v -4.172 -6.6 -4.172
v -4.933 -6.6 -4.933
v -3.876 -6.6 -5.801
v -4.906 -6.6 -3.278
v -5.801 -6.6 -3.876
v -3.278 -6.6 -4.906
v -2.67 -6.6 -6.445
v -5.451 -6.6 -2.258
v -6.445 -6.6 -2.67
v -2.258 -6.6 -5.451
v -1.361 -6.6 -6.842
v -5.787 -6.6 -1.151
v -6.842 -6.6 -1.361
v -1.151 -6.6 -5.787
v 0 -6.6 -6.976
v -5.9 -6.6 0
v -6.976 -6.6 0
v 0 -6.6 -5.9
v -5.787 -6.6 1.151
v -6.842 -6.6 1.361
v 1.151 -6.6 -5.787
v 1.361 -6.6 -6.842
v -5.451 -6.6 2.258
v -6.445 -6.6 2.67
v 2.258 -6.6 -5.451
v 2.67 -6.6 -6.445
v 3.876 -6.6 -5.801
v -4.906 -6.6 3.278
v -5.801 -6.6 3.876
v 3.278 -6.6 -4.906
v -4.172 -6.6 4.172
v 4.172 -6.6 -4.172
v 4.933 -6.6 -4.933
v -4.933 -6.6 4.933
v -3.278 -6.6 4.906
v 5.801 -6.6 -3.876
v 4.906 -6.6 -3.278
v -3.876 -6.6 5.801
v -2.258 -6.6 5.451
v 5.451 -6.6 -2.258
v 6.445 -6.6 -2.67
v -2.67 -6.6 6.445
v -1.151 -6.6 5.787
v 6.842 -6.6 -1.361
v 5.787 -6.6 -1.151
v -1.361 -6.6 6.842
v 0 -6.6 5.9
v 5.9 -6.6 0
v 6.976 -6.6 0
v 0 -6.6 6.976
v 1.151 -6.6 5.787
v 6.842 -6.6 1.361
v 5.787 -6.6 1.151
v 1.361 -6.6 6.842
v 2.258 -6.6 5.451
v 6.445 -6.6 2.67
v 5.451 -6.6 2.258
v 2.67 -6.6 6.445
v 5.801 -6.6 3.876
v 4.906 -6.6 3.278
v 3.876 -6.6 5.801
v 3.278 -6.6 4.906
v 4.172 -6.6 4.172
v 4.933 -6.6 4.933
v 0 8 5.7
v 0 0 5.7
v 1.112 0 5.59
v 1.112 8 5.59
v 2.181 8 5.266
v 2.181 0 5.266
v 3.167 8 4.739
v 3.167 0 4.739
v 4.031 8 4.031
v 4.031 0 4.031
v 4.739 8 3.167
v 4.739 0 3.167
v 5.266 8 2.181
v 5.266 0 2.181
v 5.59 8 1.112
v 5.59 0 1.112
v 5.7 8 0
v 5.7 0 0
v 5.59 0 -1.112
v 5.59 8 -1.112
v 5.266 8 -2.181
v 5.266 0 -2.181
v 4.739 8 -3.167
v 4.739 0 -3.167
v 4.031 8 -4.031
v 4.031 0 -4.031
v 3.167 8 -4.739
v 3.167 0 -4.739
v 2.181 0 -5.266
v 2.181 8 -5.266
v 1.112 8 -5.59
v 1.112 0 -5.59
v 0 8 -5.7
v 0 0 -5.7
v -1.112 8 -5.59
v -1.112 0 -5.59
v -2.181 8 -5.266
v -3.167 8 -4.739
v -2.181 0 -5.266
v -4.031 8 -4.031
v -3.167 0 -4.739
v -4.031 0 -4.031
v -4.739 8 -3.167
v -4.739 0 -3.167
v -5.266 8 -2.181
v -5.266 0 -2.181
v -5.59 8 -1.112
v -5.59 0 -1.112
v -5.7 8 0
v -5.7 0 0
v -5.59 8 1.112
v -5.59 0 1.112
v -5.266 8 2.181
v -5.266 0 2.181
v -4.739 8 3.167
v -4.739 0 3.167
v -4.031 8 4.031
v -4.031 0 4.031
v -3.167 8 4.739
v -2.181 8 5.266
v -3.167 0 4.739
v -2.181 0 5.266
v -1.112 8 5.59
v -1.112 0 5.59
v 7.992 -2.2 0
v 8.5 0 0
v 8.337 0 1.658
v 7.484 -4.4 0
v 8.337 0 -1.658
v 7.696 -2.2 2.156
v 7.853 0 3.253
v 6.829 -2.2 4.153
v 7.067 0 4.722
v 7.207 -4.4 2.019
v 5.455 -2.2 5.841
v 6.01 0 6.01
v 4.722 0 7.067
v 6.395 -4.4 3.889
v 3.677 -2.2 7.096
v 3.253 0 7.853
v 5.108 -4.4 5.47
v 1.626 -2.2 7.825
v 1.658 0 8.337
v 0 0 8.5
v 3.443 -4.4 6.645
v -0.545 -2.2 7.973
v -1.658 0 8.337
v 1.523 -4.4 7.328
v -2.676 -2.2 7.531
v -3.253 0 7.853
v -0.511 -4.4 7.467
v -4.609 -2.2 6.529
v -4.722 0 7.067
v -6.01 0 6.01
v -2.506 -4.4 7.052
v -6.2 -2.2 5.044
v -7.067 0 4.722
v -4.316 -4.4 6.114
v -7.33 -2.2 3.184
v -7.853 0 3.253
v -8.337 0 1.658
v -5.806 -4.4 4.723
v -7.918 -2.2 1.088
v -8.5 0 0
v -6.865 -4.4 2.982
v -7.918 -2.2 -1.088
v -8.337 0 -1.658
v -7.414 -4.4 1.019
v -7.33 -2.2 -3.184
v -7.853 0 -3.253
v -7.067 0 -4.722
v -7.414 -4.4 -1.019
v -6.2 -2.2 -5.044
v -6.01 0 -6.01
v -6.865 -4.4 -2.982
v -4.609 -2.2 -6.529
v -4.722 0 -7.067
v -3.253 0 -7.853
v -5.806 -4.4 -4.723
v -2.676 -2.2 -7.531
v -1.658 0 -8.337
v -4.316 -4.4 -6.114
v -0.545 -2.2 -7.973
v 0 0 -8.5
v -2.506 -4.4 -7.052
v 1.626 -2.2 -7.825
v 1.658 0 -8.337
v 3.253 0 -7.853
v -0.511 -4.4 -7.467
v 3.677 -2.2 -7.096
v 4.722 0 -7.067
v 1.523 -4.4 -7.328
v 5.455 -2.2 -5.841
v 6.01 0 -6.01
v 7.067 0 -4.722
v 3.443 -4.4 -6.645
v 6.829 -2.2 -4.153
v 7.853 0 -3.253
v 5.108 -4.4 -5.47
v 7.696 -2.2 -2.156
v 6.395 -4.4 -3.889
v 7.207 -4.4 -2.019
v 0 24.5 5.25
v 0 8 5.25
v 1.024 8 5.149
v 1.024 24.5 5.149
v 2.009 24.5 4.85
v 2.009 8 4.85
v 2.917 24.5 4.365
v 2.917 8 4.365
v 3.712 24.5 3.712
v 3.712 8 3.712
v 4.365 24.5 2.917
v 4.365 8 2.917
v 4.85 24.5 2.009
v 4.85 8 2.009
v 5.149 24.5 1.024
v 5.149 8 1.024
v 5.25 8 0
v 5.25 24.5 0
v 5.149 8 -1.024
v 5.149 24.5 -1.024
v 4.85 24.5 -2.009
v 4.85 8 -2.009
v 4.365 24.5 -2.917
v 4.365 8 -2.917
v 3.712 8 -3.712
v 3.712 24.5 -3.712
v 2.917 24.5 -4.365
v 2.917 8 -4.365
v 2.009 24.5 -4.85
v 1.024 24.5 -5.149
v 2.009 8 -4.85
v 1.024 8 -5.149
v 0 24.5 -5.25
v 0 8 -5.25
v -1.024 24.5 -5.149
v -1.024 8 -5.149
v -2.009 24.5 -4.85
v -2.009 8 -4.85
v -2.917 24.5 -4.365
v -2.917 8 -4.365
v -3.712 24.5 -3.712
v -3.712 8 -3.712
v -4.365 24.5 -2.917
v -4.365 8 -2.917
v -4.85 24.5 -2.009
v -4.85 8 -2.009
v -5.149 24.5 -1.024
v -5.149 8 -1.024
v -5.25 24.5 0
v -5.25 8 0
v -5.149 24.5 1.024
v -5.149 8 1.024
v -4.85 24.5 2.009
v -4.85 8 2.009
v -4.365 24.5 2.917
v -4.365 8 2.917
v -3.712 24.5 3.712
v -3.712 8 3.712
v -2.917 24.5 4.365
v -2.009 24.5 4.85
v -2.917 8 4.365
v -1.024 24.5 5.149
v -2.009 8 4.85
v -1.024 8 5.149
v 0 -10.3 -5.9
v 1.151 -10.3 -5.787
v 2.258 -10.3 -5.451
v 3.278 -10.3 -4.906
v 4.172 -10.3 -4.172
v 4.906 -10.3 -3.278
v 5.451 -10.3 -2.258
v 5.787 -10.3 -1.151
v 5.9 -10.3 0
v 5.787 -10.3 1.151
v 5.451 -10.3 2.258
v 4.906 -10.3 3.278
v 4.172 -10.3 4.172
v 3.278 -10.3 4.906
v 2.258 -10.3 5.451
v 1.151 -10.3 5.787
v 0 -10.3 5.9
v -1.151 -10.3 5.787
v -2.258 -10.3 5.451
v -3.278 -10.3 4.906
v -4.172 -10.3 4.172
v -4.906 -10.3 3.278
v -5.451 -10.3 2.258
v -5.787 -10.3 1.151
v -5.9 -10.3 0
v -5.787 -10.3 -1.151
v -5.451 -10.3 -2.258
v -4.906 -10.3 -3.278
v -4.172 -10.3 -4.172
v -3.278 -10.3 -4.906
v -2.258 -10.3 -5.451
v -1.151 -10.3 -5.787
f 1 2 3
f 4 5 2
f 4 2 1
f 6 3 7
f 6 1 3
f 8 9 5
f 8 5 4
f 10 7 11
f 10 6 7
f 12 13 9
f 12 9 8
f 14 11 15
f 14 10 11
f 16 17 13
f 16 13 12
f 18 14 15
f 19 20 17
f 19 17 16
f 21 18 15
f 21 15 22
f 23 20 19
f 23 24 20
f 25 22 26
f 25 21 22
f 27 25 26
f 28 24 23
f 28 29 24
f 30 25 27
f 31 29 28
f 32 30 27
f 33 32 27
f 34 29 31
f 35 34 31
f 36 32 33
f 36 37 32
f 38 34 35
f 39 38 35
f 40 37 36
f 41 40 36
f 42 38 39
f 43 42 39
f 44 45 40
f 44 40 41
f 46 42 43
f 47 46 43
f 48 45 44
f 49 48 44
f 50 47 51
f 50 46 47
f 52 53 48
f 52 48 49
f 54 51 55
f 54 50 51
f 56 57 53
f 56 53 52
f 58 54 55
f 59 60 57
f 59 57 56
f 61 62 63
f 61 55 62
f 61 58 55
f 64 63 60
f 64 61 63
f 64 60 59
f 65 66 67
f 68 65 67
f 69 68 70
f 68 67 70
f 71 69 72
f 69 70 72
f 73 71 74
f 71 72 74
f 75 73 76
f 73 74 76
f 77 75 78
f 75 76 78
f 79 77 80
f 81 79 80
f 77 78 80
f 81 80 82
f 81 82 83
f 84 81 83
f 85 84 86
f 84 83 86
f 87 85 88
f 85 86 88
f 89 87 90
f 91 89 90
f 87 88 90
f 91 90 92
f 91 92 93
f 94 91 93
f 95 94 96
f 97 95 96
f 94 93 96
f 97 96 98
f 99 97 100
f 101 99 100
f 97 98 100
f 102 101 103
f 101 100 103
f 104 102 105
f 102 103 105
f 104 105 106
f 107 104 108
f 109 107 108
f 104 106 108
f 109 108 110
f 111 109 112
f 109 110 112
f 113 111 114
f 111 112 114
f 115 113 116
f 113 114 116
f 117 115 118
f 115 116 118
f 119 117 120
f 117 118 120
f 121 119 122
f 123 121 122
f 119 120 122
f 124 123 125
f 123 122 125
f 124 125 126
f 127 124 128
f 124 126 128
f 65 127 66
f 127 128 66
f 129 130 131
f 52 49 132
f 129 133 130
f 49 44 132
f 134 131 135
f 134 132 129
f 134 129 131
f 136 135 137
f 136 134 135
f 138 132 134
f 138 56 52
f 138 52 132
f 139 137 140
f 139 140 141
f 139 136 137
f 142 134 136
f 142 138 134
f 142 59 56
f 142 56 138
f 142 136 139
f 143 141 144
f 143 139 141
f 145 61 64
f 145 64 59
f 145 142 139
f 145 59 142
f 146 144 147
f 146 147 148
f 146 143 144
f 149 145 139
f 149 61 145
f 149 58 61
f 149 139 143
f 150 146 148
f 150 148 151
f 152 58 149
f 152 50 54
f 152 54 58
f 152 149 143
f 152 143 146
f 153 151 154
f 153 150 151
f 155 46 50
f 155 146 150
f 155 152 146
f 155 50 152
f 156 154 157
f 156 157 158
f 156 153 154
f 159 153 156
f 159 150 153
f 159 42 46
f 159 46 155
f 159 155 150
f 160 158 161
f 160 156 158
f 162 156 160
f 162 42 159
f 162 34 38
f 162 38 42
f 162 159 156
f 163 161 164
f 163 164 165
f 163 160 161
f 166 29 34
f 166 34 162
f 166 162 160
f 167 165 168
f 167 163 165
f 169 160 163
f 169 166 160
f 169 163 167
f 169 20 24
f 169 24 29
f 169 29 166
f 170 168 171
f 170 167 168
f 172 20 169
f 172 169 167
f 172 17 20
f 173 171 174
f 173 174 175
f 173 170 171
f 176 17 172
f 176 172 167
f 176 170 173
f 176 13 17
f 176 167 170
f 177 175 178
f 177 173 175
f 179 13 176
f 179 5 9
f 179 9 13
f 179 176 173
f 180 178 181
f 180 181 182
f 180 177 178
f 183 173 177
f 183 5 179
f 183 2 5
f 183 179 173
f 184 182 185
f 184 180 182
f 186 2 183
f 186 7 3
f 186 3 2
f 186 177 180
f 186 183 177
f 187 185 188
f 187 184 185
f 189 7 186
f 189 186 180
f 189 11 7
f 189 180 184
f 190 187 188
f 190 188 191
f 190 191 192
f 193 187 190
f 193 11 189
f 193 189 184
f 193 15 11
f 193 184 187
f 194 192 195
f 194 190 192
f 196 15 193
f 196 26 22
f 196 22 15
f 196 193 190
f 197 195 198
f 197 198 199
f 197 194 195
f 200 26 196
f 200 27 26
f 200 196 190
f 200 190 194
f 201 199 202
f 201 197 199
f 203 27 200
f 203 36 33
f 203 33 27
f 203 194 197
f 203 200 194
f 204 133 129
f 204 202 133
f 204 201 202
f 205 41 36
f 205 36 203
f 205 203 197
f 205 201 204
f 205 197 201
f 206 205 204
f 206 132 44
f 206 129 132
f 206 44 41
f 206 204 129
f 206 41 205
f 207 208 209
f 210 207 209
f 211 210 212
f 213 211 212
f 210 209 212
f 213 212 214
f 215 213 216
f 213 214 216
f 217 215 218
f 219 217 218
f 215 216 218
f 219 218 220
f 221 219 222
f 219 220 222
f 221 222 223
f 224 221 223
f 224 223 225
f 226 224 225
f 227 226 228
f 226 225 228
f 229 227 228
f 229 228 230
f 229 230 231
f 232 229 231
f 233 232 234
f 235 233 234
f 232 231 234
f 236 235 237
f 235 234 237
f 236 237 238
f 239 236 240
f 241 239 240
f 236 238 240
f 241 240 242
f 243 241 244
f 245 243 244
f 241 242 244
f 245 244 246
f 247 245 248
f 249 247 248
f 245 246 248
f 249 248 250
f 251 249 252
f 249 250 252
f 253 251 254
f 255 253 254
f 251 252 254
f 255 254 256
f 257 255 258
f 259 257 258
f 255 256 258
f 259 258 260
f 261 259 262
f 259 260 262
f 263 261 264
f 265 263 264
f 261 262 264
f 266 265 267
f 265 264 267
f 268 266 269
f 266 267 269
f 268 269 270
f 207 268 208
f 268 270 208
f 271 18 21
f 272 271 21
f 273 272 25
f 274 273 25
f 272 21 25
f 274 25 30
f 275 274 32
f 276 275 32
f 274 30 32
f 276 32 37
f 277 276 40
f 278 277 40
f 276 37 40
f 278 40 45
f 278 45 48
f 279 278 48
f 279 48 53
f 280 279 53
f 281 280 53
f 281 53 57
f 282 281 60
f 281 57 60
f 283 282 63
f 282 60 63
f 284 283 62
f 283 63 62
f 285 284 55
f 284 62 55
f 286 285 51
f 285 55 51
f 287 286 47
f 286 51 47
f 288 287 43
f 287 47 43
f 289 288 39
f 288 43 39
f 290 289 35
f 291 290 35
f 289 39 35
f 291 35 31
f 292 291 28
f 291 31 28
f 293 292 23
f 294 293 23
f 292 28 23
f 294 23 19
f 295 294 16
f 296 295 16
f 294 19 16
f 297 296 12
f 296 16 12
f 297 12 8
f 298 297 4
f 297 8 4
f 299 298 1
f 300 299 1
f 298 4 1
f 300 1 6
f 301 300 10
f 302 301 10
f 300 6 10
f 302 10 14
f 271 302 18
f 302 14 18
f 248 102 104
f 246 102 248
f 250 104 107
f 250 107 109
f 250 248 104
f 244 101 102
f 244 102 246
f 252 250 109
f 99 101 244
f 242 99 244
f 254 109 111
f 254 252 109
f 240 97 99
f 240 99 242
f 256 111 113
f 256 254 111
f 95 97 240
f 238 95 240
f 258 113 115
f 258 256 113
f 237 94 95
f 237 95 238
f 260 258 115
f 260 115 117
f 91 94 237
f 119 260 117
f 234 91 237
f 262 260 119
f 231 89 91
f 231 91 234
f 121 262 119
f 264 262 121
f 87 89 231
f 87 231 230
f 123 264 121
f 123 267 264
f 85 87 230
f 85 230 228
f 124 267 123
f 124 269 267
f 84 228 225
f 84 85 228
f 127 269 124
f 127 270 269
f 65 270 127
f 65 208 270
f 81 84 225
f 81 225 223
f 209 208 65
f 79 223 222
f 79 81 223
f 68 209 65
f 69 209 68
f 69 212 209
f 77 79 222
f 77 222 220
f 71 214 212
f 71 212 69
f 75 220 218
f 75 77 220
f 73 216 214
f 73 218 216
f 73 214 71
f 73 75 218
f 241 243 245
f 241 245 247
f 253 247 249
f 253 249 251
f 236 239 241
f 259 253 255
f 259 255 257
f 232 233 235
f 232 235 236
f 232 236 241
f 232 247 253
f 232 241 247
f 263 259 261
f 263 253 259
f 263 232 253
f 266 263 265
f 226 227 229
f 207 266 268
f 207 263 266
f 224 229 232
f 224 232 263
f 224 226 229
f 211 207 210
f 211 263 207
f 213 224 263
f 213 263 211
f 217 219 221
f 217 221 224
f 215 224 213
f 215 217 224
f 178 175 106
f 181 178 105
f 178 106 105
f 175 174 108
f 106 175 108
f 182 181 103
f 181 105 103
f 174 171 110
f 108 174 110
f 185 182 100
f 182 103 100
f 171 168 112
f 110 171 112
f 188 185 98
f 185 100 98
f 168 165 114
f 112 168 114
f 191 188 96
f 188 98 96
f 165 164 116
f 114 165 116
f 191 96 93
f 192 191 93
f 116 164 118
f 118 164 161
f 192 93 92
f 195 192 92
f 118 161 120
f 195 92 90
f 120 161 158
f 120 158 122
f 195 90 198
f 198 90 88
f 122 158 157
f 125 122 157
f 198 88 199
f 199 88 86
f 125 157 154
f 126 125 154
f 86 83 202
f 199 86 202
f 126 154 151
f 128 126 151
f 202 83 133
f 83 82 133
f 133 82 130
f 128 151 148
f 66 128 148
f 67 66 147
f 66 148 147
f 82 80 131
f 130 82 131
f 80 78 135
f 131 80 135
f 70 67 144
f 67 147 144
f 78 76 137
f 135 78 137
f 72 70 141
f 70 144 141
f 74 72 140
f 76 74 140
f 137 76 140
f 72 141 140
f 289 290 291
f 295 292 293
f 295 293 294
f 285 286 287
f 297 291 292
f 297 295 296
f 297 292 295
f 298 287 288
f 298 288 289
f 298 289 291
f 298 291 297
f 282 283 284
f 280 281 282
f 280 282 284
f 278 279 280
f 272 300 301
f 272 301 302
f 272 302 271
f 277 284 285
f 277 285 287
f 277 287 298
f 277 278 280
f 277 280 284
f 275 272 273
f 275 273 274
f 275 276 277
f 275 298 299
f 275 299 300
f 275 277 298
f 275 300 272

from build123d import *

# Parameters (mm, degrees)
SKETCH1_R           = 5.7
BOSS_EXTRUDE1_DEPTH = 8
SKETCH2_R           = 5.25
BOSS_EXTRUDE2_DEPTH = 16.5
SKETCH3_R           = 8.5
BOSS_EXTRUDE3_DEPTH = 6.6
BOSS_EXTRUDE3_TAPER = 13
SKETCH4_R           = 5.9
BOSS_EXTRUDE4_DEPTH = 3.7


with BuildPart() as part:
    # Sketch1 → Boss-Extrude1 (new body)
    with BuildSketch(Plane(origin=(0, 0, 0), x_dir=(1, 0, 0), z_dir=(0, 1, 0))):
        with Locations(Location((0, 0, 0), (0, 0, 270))):  # turned: the seam where the file's is
            Circle(SKETCH1_R)
    extrude(amount=BOSS_EXTRUDE1_DEPTH)

    # Sketch2 → Boss-Extrude2 (add)
    with BuildSketch(Plane(origin=(0, 8, 0), x_dir=(1, 0, 0), z_dir=(0, 1, 0))):
        with Locations(Location((0, 0, 0), (0, 0, 270))):  # turned: the seam where the file's is
            Circle(SKETCH2_R)
    extrude(amount=BOSS_EXTRUDE2_DEPTH)

    # Sketch3 → Boss-Extrude3 (add)
    with BuildSketch(Plane.XZ):
        Circle(SKETCH3_R)
    extrude(amount=BOSS_EXTRUDE3_DEPTH, taper=BOSS_EXTRUDE3_TAPER)

    # Sketch4 → Boss-Extrude4 (add)
    with BuildSketch(Plane.XZ.offset(6.6)):
        with Locations(Location((0, 0, 0), (0, 0, 270))):  # turned: the seam where the file's is
            Circle(SKETCH4_R)
    extrude(amount=BOSS_EXTRUDE4_DEPTH)


solid = part.part
